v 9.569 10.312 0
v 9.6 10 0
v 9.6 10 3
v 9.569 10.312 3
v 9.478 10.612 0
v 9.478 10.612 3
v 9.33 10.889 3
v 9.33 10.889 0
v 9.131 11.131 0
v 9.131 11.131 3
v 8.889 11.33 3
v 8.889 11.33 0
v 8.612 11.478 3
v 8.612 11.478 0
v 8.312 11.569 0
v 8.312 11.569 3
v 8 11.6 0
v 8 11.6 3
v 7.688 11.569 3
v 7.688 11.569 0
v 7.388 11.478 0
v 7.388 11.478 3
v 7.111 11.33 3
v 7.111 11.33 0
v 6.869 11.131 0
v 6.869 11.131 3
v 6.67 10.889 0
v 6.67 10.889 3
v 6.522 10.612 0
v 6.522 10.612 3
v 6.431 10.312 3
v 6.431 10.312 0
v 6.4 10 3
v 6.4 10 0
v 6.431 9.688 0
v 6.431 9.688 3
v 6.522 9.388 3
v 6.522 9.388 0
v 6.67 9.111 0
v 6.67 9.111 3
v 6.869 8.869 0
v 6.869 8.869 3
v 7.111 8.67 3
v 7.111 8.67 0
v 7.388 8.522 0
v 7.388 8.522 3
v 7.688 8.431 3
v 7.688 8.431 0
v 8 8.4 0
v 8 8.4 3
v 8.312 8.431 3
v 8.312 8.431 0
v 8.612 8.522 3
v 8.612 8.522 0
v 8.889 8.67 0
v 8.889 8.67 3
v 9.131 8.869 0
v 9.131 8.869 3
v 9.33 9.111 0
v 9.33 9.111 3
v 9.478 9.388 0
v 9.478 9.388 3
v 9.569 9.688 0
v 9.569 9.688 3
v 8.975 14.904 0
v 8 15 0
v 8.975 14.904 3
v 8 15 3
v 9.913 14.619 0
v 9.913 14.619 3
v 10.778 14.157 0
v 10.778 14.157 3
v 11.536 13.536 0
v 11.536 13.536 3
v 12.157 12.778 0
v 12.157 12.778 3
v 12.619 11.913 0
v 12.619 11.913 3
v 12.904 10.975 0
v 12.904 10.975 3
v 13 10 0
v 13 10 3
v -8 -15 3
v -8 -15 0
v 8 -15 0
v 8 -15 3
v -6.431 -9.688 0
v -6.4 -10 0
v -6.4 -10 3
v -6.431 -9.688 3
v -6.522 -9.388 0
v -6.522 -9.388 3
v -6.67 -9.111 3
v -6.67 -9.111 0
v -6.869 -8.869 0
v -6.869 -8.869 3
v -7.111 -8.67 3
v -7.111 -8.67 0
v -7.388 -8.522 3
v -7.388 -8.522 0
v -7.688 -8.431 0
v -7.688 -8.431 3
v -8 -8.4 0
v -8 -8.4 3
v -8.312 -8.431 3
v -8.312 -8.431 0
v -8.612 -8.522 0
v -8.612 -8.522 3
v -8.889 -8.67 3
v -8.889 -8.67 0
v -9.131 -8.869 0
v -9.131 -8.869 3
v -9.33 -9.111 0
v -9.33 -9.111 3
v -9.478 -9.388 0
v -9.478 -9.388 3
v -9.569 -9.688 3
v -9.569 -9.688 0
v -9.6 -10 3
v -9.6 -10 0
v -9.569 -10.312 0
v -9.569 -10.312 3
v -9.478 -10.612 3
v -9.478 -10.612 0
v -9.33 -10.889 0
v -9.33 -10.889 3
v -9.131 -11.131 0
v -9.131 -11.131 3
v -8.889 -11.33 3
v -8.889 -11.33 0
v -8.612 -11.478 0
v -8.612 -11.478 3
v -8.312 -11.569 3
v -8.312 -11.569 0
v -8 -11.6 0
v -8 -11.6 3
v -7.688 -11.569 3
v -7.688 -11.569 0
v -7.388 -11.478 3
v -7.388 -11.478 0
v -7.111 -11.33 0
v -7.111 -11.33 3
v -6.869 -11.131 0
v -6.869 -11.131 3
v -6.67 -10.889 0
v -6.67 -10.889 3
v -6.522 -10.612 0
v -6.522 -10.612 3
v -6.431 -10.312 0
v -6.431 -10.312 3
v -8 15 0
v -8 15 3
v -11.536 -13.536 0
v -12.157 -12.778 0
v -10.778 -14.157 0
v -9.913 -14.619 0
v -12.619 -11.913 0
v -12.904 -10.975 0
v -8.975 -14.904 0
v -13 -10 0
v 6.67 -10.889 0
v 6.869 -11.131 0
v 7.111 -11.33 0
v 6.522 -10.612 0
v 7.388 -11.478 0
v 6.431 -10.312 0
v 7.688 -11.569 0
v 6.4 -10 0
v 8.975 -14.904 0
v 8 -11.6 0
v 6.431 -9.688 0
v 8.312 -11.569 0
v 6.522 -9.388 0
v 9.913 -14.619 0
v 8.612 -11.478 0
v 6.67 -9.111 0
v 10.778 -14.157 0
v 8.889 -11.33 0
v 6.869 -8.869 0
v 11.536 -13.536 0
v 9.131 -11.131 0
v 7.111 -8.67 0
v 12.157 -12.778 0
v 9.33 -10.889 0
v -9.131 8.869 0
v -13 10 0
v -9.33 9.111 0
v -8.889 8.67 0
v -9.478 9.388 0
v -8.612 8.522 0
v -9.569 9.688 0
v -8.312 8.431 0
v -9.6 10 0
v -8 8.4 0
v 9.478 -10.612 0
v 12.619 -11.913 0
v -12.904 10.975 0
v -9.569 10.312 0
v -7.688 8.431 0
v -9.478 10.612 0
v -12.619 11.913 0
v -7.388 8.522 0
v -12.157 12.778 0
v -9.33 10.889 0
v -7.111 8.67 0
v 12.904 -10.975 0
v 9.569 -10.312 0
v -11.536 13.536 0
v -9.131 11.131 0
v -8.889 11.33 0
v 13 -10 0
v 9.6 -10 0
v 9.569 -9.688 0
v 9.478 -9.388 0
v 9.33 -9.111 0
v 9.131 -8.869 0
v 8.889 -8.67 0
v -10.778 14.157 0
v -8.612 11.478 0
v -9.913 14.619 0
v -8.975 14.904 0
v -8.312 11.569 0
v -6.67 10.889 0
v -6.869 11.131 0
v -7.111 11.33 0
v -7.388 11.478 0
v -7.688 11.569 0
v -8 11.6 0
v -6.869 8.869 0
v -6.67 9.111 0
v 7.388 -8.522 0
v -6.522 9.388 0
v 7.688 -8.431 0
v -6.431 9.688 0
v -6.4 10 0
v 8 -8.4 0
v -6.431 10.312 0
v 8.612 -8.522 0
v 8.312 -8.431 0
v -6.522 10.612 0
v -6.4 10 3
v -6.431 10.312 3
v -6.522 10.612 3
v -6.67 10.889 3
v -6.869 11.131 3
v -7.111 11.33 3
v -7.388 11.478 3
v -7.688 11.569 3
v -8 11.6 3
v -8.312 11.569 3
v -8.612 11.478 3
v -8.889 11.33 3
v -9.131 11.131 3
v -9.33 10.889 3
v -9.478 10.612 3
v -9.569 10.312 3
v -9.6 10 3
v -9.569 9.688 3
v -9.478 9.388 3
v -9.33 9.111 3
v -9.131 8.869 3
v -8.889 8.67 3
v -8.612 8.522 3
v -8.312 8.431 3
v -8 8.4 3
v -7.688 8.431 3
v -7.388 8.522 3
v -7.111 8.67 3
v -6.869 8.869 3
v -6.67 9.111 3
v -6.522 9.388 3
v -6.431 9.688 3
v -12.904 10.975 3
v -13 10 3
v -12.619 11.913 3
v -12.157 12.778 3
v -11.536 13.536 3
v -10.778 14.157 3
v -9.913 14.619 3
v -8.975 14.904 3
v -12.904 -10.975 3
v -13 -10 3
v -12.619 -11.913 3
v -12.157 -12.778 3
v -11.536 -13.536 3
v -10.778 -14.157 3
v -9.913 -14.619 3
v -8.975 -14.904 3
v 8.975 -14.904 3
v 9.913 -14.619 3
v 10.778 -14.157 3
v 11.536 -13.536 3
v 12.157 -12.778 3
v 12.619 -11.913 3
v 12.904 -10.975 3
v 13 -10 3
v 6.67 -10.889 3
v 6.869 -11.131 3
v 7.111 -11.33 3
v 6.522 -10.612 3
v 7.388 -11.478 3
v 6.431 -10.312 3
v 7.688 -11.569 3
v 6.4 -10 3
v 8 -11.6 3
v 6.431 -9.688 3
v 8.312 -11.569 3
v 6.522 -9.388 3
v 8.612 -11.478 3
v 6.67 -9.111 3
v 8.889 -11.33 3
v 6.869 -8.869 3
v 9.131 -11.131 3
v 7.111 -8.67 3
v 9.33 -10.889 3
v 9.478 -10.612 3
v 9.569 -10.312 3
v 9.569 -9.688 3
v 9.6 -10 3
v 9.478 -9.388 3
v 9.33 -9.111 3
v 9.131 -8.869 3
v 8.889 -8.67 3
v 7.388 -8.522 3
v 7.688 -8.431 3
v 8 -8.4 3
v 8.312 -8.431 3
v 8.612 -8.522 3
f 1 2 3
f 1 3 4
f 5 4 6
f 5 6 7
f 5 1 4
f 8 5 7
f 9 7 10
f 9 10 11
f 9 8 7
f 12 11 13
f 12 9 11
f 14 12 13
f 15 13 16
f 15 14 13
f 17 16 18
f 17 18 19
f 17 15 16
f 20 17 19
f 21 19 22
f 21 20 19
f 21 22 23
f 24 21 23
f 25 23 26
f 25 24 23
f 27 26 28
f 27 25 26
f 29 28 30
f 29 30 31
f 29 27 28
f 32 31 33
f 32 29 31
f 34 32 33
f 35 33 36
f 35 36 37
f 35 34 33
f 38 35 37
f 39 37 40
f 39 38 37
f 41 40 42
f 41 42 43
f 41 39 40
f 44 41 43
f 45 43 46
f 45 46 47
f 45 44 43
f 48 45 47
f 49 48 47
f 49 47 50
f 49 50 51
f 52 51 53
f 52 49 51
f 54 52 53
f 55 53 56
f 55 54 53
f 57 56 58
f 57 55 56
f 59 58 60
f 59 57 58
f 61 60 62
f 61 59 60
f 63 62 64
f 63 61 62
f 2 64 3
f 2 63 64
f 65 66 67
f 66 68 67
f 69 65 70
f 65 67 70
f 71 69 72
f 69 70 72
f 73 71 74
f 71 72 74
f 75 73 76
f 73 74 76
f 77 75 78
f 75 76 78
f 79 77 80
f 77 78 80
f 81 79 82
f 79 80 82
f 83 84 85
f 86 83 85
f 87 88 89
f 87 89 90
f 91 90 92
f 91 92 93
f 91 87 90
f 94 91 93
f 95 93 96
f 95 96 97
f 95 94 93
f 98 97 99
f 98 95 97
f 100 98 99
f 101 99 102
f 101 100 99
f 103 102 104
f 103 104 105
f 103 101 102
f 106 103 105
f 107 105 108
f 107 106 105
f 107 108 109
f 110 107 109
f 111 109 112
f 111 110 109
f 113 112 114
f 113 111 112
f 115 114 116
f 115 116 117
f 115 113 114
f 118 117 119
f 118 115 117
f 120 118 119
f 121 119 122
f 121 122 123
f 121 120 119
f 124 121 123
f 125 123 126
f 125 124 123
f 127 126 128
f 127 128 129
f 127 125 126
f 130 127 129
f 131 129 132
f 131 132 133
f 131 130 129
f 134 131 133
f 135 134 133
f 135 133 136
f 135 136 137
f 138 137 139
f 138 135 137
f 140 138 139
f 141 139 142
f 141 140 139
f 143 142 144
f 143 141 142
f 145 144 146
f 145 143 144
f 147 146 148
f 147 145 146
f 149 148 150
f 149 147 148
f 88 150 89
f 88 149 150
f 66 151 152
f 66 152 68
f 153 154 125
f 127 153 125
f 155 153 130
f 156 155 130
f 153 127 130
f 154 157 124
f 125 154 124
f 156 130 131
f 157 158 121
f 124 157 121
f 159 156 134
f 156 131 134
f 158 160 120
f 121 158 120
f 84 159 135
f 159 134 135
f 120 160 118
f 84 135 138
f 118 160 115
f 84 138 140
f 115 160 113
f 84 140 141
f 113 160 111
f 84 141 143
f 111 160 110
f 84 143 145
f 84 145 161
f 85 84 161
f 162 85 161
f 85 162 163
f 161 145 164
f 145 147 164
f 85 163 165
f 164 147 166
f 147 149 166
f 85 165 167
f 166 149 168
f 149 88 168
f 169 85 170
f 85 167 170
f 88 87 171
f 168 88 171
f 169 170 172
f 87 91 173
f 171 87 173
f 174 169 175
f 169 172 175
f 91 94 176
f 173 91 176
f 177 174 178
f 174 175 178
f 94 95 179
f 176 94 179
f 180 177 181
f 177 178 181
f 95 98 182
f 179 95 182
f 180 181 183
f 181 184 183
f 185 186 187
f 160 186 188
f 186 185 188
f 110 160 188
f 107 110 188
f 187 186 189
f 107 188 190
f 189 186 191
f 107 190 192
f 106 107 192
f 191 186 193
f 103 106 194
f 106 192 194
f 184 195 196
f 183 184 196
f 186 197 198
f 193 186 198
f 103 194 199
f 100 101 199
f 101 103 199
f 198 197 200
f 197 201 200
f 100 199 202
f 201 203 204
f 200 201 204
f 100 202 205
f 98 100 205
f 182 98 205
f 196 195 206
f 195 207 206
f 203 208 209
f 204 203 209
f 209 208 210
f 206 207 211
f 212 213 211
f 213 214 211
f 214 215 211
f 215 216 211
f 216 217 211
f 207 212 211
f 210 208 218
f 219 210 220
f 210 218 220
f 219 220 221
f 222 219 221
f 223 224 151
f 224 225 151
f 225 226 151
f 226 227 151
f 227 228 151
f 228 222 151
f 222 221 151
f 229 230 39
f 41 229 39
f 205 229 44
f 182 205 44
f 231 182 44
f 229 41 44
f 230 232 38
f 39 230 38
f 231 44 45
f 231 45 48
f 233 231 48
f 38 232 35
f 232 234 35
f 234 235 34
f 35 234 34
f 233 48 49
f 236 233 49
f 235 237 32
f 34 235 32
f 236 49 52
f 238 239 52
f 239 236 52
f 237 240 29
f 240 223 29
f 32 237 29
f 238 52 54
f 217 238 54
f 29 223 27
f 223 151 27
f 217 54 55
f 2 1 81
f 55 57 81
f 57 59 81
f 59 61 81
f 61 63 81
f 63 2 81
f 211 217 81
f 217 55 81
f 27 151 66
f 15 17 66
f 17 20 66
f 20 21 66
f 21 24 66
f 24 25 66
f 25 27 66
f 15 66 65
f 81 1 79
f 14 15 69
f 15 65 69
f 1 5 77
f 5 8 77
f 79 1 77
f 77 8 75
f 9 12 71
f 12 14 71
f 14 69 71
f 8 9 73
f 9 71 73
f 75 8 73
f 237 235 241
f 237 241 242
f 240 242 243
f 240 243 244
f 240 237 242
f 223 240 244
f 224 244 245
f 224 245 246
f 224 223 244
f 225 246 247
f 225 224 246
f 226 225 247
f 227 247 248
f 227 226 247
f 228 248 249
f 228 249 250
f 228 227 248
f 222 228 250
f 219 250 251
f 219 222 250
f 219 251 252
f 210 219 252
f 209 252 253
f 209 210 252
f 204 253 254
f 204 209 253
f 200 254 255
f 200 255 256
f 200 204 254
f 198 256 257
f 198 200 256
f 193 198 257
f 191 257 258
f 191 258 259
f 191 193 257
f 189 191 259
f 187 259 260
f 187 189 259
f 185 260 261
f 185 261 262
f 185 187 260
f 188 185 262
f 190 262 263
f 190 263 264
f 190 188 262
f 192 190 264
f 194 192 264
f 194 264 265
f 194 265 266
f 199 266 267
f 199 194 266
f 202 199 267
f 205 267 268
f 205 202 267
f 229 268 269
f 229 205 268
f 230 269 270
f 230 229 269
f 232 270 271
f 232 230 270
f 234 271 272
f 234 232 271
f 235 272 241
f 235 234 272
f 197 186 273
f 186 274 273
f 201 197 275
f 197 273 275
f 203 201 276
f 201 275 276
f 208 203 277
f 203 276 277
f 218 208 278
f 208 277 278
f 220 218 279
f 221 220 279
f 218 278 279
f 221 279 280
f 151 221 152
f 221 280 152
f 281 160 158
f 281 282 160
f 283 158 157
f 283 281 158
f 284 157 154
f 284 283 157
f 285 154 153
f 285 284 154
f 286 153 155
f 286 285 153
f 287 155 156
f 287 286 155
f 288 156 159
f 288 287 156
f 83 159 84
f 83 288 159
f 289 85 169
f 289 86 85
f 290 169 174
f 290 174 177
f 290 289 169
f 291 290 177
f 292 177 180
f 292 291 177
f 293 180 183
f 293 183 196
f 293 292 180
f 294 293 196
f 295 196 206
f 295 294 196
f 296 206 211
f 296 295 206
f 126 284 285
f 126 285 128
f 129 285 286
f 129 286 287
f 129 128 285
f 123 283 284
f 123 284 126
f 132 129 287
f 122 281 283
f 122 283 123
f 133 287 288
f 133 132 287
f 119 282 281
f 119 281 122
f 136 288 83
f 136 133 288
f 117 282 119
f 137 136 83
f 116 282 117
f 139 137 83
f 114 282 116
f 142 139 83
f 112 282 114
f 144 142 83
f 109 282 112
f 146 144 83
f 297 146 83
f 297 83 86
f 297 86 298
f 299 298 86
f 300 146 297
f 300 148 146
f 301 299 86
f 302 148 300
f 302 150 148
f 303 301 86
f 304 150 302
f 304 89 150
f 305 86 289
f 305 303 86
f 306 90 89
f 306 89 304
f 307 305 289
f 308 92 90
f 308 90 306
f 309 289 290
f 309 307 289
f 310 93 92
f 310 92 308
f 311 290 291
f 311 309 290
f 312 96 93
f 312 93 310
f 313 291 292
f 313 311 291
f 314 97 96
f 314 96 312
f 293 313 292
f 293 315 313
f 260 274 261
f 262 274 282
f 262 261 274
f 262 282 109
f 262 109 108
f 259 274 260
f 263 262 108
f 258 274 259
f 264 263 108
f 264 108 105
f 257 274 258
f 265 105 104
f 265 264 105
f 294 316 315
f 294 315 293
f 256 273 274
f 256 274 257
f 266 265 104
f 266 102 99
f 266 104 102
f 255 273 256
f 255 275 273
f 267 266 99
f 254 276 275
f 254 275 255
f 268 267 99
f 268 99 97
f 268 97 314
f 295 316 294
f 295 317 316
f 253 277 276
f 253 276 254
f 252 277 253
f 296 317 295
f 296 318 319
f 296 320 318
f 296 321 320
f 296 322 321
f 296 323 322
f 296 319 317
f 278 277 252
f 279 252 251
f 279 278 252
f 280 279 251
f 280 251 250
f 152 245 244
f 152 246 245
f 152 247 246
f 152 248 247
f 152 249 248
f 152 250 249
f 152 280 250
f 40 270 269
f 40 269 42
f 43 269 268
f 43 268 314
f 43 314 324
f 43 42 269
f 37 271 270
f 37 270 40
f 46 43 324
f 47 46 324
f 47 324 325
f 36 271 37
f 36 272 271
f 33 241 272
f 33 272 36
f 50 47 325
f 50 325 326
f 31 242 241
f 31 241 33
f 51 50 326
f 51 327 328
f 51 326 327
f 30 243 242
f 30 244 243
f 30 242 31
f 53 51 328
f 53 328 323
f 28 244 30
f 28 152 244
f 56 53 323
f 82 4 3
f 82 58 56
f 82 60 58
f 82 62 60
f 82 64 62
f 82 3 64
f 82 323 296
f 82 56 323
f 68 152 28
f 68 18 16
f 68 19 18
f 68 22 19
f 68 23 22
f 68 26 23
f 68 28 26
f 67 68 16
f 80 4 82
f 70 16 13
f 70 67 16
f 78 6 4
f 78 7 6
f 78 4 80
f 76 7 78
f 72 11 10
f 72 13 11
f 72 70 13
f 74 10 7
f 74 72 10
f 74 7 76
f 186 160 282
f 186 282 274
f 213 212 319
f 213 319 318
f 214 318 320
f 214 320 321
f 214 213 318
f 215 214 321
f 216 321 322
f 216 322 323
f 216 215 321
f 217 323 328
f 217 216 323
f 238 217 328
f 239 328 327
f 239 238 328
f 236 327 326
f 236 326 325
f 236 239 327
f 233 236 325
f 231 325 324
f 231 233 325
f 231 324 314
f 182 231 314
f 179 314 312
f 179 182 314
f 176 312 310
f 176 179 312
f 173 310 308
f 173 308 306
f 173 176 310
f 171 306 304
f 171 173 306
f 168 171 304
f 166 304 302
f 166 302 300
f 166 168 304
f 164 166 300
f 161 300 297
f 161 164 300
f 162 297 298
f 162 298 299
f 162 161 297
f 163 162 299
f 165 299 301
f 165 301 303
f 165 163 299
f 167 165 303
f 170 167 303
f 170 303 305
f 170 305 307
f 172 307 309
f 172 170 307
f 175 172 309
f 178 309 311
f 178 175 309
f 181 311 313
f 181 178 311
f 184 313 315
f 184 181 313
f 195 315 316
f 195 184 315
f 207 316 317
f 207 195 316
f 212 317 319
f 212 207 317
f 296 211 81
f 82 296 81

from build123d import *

# Parameters (mm, degrees)
ESBO_O1_W                = 26
ESBO_O1_H                = 30
ESBO_O1_R                = 1.6
RESSALTO_EXTRUS_O1_DEPTH = 3
FILETE1_R                = 5


with BuildPart() as part:
    # Esboço1 → Ressalto-extrusão1 (new body)
    with BuildSketch(Plane.XY):
        Rectangle(ESBO_O1_W, ESBO_O1_H)
        with Locations((-8, 10)):
            Circle(ESBO_O1_R, mode=Mode.SUBTRACT)
        with Locations((8, 10)):
            Circle(ESBO_O1_R, mode=Mode.SUBTRACT)
        with Locations((8, -10)):
            Circle(ESBO_O1_R, mode=Mode.SUBTRACT)
        with Locations((-8, -10)):
            Circle(ESBO_O1_R, mode=Mode.SUBTRACT)
    extrude(amount=RESSALTO_EXTRUS_O1_DEPTH)

    # Filete1
    filete1_edges = [part.edges().sort_by_distance(p)[0] for p in [
        (-13, -15, 1.5),
        (-13, 15, 1.5),
        (13, 15, 1.5),
        (13, -15, 1.5),
    ]]
    fillet(filete1_edges, radius=FILETE1_R)


solid = part.part
